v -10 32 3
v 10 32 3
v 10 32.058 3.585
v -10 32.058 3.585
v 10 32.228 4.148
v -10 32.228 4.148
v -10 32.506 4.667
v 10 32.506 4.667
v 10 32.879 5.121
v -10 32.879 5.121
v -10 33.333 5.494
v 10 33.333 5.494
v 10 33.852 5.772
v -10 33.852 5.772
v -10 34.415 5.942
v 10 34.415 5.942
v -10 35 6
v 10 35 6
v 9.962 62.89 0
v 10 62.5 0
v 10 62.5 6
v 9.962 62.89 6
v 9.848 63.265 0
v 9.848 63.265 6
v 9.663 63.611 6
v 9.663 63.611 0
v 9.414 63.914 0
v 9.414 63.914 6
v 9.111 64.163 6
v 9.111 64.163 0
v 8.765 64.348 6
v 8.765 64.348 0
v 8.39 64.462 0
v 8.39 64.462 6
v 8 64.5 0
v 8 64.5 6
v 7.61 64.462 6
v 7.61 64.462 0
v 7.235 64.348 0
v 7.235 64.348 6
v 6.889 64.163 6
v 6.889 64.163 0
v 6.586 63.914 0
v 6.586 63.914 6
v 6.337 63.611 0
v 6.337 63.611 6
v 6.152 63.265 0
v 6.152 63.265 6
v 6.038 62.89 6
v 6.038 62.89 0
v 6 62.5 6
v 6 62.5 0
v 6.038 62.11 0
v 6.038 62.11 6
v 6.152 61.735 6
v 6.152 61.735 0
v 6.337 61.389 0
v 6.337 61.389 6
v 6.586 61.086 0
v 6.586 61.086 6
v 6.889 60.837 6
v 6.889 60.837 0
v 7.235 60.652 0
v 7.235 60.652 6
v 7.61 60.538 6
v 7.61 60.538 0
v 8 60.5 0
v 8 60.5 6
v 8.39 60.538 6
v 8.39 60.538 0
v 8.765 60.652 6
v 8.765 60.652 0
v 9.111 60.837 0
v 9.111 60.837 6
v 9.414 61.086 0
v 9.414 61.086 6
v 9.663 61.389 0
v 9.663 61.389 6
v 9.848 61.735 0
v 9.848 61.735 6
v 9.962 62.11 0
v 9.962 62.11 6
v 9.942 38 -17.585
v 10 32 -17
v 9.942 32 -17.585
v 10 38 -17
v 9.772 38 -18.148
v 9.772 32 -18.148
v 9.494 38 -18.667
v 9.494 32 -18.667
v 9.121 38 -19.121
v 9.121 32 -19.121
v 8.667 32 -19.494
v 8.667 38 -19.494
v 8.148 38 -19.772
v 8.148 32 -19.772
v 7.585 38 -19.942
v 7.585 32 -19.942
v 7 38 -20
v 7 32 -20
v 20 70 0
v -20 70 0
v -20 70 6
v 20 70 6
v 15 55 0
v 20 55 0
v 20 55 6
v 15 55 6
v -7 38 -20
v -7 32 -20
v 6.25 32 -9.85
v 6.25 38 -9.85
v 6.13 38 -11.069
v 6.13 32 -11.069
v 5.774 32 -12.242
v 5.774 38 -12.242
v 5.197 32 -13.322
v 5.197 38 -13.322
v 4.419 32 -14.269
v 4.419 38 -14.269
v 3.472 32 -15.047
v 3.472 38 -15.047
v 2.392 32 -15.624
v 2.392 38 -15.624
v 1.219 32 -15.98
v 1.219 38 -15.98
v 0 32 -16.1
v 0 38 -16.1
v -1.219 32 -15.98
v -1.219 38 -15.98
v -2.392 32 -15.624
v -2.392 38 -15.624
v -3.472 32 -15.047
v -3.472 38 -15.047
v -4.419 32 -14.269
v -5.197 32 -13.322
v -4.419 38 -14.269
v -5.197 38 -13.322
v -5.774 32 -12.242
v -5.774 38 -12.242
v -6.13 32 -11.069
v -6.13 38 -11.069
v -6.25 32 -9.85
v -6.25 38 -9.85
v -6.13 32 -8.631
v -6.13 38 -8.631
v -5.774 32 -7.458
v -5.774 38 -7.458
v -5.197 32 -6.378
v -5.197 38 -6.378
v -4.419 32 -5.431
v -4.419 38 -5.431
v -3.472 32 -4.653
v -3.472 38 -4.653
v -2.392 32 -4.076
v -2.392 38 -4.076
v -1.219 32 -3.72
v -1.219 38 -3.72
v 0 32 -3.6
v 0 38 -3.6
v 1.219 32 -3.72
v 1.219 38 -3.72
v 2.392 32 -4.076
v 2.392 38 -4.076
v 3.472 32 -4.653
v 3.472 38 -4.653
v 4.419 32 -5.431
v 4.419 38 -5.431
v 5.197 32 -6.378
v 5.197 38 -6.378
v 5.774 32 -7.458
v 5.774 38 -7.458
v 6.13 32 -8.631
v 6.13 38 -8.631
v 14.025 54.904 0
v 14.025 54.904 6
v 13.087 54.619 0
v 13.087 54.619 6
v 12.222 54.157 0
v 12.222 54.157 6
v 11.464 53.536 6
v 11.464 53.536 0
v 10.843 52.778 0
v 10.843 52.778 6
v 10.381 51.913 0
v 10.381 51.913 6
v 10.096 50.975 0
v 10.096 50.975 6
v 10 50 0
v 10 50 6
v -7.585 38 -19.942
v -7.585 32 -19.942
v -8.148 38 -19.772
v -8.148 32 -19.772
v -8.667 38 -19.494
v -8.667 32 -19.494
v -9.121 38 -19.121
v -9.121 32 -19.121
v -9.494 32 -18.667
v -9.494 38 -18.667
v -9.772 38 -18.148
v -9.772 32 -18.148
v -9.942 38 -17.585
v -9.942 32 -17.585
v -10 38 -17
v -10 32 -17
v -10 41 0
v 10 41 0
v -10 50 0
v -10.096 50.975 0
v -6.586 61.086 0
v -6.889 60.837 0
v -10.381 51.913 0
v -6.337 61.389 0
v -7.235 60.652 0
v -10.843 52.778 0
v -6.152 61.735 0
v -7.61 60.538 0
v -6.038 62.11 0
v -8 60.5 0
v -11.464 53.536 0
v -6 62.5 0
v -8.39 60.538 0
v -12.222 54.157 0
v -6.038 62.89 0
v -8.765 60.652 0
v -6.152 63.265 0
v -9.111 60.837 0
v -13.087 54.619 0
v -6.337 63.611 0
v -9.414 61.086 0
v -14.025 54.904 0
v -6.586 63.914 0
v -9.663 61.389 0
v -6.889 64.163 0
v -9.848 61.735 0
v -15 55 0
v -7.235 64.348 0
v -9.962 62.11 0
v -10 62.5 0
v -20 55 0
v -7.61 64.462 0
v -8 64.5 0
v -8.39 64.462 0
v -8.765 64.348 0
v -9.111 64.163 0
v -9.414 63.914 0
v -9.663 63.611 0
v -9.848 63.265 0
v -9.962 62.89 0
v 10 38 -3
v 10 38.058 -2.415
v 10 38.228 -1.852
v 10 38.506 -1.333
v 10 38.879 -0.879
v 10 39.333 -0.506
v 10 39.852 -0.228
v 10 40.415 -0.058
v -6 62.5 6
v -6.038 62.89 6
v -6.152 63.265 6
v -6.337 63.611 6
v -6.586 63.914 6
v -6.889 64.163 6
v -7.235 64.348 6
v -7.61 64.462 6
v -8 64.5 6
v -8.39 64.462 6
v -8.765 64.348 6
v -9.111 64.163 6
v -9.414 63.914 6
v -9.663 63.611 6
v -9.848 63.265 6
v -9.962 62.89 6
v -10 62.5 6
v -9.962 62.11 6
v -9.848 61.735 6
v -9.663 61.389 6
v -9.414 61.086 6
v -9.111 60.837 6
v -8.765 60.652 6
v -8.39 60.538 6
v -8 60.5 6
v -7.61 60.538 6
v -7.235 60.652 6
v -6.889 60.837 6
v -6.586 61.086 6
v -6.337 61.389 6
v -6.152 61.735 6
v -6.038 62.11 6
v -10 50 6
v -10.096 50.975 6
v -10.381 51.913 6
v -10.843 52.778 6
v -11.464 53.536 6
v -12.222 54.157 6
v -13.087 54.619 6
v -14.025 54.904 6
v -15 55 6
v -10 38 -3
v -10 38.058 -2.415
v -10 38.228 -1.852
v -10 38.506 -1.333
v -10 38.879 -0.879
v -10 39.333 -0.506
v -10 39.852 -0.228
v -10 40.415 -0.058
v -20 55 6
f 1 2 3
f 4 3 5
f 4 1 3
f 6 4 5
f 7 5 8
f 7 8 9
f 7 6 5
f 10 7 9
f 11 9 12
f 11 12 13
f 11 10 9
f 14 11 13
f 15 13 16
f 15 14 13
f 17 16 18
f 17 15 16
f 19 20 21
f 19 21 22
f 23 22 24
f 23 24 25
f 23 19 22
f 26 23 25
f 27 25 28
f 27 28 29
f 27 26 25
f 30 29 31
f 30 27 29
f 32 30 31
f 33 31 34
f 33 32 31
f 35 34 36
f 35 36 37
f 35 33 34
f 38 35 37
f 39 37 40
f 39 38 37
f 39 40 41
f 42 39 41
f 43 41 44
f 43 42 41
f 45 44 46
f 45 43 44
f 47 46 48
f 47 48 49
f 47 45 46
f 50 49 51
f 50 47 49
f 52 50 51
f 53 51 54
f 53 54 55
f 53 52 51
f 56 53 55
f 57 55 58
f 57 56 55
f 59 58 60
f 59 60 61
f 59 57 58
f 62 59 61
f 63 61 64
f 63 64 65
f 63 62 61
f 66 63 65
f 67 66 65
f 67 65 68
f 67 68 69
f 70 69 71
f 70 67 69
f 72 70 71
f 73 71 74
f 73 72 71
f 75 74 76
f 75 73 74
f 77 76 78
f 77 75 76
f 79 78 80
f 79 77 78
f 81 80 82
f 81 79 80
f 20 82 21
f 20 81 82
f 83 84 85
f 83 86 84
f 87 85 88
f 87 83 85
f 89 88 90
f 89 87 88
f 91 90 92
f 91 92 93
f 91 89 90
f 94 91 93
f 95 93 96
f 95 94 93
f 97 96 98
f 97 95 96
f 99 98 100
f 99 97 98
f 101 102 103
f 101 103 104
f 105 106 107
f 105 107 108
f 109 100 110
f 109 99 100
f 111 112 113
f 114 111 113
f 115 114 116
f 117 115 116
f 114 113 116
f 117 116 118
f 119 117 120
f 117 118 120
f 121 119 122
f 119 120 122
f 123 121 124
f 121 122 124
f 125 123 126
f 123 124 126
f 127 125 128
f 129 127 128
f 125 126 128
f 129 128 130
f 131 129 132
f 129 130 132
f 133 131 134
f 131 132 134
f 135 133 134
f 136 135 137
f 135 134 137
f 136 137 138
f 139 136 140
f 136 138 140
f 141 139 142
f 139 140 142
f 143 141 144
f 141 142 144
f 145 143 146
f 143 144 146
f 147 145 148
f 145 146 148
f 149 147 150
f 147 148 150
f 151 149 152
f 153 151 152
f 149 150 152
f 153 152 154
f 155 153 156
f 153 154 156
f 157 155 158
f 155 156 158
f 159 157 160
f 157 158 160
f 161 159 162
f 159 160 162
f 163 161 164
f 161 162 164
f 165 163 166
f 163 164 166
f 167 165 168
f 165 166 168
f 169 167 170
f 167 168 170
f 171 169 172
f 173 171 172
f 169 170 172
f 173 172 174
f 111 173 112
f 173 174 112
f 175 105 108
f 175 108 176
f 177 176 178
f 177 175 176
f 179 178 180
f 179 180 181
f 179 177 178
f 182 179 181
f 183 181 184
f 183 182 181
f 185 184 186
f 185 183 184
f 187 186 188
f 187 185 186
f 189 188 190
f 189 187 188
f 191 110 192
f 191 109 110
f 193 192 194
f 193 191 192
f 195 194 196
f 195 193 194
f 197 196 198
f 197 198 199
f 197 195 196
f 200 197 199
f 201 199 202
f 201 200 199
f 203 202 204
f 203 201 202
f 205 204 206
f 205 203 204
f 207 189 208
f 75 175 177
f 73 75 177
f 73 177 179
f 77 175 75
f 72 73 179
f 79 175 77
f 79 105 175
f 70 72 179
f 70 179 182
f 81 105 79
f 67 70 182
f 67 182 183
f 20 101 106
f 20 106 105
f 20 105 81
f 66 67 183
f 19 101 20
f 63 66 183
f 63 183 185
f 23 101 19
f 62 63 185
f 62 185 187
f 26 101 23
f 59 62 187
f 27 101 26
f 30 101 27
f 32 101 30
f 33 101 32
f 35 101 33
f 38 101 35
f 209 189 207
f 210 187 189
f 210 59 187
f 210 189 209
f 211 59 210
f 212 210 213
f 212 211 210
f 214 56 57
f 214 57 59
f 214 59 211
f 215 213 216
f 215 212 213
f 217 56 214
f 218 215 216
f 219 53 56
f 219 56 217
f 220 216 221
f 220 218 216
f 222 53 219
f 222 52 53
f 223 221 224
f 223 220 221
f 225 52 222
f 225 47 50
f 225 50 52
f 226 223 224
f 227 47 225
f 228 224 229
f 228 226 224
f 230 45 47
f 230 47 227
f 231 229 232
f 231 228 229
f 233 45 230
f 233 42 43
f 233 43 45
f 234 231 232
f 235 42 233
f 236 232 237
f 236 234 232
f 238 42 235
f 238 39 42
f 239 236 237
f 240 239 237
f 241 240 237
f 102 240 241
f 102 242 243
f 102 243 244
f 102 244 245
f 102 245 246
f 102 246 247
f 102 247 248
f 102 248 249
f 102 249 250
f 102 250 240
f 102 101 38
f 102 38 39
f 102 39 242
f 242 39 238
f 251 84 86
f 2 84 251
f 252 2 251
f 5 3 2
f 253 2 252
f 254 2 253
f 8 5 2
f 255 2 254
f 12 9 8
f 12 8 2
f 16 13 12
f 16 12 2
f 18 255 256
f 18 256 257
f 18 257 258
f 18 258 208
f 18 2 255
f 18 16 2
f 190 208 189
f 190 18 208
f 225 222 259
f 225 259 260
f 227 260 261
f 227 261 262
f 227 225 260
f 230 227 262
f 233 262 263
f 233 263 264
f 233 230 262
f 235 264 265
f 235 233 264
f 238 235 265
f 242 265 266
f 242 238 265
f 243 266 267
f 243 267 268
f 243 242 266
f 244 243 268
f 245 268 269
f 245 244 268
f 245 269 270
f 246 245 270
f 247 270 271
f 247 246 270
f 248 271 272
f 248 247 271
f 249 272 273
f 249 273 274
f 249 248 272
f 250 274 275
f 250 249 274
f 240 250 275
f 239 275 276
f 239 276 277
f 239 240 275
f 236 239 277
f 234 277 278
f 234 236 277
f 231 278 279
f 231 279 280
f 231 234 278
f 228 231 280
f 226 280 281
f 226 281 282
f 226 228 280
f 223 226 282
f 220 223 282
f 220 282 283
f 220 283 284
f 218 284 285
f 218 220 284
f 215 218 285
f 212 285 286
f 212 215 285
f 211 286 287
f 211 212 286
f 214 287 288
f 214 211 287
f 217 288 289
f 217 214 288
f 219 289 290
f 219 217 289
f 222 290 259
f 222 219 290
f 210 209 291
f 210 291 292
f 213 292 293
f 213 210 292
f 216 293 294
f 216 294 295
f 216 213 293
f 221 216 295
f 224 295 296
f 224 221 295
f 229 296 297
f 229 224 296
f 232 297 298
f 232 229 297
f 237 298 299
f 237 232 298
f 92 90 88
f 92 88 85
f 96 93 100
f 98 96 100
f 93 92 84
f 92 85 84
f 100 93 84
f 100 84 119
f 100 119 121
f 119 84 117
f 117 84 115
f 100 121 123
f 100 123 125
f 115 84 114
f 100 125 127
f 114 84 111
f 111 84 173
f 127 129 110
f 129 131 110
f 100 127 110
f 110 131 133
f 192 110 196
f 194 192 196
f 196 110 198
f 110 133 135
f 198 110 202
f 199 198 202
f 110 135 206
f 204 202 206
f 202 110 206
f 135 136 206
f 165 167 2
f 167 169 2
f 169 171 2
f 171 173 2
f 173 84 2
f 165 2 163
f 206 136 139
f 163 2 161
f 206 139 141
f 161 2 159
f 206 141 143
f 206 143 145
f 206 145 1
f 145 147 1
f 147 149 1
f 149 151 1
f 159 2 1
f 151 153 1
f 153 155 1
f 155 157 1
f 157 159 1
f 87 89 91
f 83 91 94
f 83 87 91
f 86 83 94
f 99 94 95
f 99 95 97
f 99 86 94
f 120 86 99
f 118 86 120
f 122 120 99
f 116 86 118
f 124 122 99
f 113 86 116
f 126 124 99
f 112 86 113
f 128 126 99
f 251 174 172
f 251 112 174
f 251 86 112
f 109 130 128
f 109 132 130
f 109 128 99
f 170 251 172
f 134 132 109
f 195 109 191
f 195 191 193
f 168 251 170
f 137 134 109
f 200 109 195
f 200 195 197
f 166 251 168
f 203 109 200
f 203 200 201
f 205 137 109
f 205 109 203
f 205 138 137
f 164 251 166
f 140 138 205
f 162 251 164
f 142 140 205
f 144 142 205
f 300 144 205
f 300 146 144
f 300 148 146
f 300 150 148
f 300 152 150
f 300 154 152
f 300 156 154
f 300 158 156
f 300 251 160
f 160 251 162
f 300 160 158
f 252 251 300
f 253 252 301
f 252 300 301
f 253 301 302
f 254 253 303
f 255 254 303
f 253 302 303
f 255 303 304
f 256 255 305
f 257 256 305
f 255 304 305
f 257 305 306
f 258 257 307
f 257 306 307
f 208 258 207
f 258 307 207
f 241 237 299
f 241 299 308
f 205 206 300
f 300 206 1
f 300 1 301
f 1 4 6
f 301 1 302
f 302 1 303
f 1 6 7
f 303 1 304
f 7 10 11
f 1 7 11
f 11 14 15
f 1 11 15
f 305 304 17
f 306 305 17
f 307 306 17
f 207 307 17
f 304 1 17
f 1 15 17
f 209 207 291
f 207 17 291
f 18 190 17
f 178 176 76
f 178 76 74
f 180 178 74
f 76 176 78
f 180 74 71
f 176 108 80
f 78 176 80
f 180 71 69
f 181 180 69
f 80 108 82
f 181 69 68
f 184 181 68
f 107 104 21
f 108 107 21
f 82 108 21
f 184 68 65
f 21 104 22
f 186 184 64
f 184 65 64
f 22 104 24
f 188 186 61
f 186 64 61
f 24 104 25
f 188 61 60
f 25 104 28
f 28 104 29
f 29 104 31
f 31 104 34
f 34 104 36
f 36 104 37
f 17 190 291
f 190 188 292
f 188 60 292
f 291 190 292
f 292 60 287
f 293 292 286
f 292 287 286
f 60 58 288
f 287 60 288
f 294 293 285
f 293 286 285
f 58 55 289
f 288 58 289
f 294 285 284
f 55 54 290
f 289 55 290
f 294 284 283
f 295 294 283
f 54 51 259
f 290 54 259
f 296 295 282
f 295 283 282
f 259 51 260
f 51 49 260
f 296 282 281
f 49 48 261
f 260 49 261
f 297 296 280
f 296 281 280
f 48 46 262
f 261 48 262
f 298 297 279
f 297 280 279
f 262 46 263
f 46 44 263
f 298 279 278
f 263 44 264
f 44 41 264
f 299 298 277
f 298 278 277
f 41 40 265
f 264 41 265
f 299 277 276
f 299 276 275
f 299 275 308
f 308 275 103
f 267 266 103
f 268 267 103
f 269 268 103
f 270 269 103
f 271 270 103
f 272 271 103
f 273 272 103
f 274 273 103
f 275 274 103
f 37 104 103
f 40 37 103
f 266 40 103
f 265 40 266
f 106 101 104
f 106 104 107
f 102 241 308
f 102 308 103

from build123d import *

# Parameters (mm, degrees)
SKETCH1_R           = 2
BOSS_EXTRUDE1_DEPTH = 6
SKETCH2_W           = 20
SKETCH2_H           = 6
BOSS_EXTRUDE2_DEPTH = 20
SKETCH3_R           = 6.25
CUT_EXTRUDE1_DEPTH  = 6
FILLET1_R           = 3
FILLET2_R           = 3
FILLET3_R           = 3


with BuildPart() as part:
    # Sketch1 → Boss-Extrude1 (new body)
    with BuildSketch(Plane.XY):
        with BuildLine():
            Line((-20, 70), (20, 70))
            Line((20, 70), (20, 55))
            Line((20, 55), (15, 55))
            ThreePointArc((15, 55), (11.464466094, 53.535533906), (10, 50))
            Line((10, 50), (10, 32))
            Line((10, 32), (-10, 32))
            Line((-10, 32), (-10, 50))
            ThreePointArc((-10, 50), (-11.464466094, 53.535533906), (-15, 55))
            Line((-15, 55), (-20, 55))
            Line((-20, 55), (-20, 70))
        make_face()
        with Locations((-8, 62.5)):
            Circle(SKETCH1_R, mode=Mode.SUBTRACT)
        with Locations((8, 62.5)):
            Circle(SKETCH1_R, mode=Mode.SUBTRACT)
    extrude(amount=BOSS_EXTRUDE1_DEPTH)

    # Sketch2 → Boss-Extrude2 (add)
    with BuildSketch(Plane(origin=(0, 0, 0), x_dir=(-1, 0, 0), z_dir=(0, 0, -1))):
        with Locations((0, 35)):
            Rectangle(SKETCH2_W, SKETCH2_H)
    extrude(amount=BOSS_EXTRUDE2_DEPTH)

    # Sketch3 → Cut-Extrude1 (cut)
    with BuildSketch(Plane(origin=(0, 38, 0), x_dir=(1, 0, 0), z_dir=(0, 1, 0))):
        with Locations((0, 9.85)):
            Circle(SKETCH3_R)
    extrude(amount=-CUT_EXTRUDE1_DEPTH, mode=Mode.SUBTRACT)

    # Fillet1
    fillet1_edges = [part.edges().sort_by_distance(p)[0] for p in [
        (10, 35, -20),
        (-10, 35, -20),
    ]]
    fillet(fillet1_edges, radius=FILLET1_R)

    # Fillet2
    fillet2_edges = [part.edges().sort_by_distance(p)[0] for p in [
        (0, 38, 0),
    ]]
    fillet(fillet2_edges, radius=FILLET2_R)

    # Fillet3
    fillet3_edges = [part.edges().sort_by_distance(p)[0] for p in [
        (0, 32, 6),
    ]]
    fillet(fillet3_edges, radius=FILLET3_R)


solid = part.part
